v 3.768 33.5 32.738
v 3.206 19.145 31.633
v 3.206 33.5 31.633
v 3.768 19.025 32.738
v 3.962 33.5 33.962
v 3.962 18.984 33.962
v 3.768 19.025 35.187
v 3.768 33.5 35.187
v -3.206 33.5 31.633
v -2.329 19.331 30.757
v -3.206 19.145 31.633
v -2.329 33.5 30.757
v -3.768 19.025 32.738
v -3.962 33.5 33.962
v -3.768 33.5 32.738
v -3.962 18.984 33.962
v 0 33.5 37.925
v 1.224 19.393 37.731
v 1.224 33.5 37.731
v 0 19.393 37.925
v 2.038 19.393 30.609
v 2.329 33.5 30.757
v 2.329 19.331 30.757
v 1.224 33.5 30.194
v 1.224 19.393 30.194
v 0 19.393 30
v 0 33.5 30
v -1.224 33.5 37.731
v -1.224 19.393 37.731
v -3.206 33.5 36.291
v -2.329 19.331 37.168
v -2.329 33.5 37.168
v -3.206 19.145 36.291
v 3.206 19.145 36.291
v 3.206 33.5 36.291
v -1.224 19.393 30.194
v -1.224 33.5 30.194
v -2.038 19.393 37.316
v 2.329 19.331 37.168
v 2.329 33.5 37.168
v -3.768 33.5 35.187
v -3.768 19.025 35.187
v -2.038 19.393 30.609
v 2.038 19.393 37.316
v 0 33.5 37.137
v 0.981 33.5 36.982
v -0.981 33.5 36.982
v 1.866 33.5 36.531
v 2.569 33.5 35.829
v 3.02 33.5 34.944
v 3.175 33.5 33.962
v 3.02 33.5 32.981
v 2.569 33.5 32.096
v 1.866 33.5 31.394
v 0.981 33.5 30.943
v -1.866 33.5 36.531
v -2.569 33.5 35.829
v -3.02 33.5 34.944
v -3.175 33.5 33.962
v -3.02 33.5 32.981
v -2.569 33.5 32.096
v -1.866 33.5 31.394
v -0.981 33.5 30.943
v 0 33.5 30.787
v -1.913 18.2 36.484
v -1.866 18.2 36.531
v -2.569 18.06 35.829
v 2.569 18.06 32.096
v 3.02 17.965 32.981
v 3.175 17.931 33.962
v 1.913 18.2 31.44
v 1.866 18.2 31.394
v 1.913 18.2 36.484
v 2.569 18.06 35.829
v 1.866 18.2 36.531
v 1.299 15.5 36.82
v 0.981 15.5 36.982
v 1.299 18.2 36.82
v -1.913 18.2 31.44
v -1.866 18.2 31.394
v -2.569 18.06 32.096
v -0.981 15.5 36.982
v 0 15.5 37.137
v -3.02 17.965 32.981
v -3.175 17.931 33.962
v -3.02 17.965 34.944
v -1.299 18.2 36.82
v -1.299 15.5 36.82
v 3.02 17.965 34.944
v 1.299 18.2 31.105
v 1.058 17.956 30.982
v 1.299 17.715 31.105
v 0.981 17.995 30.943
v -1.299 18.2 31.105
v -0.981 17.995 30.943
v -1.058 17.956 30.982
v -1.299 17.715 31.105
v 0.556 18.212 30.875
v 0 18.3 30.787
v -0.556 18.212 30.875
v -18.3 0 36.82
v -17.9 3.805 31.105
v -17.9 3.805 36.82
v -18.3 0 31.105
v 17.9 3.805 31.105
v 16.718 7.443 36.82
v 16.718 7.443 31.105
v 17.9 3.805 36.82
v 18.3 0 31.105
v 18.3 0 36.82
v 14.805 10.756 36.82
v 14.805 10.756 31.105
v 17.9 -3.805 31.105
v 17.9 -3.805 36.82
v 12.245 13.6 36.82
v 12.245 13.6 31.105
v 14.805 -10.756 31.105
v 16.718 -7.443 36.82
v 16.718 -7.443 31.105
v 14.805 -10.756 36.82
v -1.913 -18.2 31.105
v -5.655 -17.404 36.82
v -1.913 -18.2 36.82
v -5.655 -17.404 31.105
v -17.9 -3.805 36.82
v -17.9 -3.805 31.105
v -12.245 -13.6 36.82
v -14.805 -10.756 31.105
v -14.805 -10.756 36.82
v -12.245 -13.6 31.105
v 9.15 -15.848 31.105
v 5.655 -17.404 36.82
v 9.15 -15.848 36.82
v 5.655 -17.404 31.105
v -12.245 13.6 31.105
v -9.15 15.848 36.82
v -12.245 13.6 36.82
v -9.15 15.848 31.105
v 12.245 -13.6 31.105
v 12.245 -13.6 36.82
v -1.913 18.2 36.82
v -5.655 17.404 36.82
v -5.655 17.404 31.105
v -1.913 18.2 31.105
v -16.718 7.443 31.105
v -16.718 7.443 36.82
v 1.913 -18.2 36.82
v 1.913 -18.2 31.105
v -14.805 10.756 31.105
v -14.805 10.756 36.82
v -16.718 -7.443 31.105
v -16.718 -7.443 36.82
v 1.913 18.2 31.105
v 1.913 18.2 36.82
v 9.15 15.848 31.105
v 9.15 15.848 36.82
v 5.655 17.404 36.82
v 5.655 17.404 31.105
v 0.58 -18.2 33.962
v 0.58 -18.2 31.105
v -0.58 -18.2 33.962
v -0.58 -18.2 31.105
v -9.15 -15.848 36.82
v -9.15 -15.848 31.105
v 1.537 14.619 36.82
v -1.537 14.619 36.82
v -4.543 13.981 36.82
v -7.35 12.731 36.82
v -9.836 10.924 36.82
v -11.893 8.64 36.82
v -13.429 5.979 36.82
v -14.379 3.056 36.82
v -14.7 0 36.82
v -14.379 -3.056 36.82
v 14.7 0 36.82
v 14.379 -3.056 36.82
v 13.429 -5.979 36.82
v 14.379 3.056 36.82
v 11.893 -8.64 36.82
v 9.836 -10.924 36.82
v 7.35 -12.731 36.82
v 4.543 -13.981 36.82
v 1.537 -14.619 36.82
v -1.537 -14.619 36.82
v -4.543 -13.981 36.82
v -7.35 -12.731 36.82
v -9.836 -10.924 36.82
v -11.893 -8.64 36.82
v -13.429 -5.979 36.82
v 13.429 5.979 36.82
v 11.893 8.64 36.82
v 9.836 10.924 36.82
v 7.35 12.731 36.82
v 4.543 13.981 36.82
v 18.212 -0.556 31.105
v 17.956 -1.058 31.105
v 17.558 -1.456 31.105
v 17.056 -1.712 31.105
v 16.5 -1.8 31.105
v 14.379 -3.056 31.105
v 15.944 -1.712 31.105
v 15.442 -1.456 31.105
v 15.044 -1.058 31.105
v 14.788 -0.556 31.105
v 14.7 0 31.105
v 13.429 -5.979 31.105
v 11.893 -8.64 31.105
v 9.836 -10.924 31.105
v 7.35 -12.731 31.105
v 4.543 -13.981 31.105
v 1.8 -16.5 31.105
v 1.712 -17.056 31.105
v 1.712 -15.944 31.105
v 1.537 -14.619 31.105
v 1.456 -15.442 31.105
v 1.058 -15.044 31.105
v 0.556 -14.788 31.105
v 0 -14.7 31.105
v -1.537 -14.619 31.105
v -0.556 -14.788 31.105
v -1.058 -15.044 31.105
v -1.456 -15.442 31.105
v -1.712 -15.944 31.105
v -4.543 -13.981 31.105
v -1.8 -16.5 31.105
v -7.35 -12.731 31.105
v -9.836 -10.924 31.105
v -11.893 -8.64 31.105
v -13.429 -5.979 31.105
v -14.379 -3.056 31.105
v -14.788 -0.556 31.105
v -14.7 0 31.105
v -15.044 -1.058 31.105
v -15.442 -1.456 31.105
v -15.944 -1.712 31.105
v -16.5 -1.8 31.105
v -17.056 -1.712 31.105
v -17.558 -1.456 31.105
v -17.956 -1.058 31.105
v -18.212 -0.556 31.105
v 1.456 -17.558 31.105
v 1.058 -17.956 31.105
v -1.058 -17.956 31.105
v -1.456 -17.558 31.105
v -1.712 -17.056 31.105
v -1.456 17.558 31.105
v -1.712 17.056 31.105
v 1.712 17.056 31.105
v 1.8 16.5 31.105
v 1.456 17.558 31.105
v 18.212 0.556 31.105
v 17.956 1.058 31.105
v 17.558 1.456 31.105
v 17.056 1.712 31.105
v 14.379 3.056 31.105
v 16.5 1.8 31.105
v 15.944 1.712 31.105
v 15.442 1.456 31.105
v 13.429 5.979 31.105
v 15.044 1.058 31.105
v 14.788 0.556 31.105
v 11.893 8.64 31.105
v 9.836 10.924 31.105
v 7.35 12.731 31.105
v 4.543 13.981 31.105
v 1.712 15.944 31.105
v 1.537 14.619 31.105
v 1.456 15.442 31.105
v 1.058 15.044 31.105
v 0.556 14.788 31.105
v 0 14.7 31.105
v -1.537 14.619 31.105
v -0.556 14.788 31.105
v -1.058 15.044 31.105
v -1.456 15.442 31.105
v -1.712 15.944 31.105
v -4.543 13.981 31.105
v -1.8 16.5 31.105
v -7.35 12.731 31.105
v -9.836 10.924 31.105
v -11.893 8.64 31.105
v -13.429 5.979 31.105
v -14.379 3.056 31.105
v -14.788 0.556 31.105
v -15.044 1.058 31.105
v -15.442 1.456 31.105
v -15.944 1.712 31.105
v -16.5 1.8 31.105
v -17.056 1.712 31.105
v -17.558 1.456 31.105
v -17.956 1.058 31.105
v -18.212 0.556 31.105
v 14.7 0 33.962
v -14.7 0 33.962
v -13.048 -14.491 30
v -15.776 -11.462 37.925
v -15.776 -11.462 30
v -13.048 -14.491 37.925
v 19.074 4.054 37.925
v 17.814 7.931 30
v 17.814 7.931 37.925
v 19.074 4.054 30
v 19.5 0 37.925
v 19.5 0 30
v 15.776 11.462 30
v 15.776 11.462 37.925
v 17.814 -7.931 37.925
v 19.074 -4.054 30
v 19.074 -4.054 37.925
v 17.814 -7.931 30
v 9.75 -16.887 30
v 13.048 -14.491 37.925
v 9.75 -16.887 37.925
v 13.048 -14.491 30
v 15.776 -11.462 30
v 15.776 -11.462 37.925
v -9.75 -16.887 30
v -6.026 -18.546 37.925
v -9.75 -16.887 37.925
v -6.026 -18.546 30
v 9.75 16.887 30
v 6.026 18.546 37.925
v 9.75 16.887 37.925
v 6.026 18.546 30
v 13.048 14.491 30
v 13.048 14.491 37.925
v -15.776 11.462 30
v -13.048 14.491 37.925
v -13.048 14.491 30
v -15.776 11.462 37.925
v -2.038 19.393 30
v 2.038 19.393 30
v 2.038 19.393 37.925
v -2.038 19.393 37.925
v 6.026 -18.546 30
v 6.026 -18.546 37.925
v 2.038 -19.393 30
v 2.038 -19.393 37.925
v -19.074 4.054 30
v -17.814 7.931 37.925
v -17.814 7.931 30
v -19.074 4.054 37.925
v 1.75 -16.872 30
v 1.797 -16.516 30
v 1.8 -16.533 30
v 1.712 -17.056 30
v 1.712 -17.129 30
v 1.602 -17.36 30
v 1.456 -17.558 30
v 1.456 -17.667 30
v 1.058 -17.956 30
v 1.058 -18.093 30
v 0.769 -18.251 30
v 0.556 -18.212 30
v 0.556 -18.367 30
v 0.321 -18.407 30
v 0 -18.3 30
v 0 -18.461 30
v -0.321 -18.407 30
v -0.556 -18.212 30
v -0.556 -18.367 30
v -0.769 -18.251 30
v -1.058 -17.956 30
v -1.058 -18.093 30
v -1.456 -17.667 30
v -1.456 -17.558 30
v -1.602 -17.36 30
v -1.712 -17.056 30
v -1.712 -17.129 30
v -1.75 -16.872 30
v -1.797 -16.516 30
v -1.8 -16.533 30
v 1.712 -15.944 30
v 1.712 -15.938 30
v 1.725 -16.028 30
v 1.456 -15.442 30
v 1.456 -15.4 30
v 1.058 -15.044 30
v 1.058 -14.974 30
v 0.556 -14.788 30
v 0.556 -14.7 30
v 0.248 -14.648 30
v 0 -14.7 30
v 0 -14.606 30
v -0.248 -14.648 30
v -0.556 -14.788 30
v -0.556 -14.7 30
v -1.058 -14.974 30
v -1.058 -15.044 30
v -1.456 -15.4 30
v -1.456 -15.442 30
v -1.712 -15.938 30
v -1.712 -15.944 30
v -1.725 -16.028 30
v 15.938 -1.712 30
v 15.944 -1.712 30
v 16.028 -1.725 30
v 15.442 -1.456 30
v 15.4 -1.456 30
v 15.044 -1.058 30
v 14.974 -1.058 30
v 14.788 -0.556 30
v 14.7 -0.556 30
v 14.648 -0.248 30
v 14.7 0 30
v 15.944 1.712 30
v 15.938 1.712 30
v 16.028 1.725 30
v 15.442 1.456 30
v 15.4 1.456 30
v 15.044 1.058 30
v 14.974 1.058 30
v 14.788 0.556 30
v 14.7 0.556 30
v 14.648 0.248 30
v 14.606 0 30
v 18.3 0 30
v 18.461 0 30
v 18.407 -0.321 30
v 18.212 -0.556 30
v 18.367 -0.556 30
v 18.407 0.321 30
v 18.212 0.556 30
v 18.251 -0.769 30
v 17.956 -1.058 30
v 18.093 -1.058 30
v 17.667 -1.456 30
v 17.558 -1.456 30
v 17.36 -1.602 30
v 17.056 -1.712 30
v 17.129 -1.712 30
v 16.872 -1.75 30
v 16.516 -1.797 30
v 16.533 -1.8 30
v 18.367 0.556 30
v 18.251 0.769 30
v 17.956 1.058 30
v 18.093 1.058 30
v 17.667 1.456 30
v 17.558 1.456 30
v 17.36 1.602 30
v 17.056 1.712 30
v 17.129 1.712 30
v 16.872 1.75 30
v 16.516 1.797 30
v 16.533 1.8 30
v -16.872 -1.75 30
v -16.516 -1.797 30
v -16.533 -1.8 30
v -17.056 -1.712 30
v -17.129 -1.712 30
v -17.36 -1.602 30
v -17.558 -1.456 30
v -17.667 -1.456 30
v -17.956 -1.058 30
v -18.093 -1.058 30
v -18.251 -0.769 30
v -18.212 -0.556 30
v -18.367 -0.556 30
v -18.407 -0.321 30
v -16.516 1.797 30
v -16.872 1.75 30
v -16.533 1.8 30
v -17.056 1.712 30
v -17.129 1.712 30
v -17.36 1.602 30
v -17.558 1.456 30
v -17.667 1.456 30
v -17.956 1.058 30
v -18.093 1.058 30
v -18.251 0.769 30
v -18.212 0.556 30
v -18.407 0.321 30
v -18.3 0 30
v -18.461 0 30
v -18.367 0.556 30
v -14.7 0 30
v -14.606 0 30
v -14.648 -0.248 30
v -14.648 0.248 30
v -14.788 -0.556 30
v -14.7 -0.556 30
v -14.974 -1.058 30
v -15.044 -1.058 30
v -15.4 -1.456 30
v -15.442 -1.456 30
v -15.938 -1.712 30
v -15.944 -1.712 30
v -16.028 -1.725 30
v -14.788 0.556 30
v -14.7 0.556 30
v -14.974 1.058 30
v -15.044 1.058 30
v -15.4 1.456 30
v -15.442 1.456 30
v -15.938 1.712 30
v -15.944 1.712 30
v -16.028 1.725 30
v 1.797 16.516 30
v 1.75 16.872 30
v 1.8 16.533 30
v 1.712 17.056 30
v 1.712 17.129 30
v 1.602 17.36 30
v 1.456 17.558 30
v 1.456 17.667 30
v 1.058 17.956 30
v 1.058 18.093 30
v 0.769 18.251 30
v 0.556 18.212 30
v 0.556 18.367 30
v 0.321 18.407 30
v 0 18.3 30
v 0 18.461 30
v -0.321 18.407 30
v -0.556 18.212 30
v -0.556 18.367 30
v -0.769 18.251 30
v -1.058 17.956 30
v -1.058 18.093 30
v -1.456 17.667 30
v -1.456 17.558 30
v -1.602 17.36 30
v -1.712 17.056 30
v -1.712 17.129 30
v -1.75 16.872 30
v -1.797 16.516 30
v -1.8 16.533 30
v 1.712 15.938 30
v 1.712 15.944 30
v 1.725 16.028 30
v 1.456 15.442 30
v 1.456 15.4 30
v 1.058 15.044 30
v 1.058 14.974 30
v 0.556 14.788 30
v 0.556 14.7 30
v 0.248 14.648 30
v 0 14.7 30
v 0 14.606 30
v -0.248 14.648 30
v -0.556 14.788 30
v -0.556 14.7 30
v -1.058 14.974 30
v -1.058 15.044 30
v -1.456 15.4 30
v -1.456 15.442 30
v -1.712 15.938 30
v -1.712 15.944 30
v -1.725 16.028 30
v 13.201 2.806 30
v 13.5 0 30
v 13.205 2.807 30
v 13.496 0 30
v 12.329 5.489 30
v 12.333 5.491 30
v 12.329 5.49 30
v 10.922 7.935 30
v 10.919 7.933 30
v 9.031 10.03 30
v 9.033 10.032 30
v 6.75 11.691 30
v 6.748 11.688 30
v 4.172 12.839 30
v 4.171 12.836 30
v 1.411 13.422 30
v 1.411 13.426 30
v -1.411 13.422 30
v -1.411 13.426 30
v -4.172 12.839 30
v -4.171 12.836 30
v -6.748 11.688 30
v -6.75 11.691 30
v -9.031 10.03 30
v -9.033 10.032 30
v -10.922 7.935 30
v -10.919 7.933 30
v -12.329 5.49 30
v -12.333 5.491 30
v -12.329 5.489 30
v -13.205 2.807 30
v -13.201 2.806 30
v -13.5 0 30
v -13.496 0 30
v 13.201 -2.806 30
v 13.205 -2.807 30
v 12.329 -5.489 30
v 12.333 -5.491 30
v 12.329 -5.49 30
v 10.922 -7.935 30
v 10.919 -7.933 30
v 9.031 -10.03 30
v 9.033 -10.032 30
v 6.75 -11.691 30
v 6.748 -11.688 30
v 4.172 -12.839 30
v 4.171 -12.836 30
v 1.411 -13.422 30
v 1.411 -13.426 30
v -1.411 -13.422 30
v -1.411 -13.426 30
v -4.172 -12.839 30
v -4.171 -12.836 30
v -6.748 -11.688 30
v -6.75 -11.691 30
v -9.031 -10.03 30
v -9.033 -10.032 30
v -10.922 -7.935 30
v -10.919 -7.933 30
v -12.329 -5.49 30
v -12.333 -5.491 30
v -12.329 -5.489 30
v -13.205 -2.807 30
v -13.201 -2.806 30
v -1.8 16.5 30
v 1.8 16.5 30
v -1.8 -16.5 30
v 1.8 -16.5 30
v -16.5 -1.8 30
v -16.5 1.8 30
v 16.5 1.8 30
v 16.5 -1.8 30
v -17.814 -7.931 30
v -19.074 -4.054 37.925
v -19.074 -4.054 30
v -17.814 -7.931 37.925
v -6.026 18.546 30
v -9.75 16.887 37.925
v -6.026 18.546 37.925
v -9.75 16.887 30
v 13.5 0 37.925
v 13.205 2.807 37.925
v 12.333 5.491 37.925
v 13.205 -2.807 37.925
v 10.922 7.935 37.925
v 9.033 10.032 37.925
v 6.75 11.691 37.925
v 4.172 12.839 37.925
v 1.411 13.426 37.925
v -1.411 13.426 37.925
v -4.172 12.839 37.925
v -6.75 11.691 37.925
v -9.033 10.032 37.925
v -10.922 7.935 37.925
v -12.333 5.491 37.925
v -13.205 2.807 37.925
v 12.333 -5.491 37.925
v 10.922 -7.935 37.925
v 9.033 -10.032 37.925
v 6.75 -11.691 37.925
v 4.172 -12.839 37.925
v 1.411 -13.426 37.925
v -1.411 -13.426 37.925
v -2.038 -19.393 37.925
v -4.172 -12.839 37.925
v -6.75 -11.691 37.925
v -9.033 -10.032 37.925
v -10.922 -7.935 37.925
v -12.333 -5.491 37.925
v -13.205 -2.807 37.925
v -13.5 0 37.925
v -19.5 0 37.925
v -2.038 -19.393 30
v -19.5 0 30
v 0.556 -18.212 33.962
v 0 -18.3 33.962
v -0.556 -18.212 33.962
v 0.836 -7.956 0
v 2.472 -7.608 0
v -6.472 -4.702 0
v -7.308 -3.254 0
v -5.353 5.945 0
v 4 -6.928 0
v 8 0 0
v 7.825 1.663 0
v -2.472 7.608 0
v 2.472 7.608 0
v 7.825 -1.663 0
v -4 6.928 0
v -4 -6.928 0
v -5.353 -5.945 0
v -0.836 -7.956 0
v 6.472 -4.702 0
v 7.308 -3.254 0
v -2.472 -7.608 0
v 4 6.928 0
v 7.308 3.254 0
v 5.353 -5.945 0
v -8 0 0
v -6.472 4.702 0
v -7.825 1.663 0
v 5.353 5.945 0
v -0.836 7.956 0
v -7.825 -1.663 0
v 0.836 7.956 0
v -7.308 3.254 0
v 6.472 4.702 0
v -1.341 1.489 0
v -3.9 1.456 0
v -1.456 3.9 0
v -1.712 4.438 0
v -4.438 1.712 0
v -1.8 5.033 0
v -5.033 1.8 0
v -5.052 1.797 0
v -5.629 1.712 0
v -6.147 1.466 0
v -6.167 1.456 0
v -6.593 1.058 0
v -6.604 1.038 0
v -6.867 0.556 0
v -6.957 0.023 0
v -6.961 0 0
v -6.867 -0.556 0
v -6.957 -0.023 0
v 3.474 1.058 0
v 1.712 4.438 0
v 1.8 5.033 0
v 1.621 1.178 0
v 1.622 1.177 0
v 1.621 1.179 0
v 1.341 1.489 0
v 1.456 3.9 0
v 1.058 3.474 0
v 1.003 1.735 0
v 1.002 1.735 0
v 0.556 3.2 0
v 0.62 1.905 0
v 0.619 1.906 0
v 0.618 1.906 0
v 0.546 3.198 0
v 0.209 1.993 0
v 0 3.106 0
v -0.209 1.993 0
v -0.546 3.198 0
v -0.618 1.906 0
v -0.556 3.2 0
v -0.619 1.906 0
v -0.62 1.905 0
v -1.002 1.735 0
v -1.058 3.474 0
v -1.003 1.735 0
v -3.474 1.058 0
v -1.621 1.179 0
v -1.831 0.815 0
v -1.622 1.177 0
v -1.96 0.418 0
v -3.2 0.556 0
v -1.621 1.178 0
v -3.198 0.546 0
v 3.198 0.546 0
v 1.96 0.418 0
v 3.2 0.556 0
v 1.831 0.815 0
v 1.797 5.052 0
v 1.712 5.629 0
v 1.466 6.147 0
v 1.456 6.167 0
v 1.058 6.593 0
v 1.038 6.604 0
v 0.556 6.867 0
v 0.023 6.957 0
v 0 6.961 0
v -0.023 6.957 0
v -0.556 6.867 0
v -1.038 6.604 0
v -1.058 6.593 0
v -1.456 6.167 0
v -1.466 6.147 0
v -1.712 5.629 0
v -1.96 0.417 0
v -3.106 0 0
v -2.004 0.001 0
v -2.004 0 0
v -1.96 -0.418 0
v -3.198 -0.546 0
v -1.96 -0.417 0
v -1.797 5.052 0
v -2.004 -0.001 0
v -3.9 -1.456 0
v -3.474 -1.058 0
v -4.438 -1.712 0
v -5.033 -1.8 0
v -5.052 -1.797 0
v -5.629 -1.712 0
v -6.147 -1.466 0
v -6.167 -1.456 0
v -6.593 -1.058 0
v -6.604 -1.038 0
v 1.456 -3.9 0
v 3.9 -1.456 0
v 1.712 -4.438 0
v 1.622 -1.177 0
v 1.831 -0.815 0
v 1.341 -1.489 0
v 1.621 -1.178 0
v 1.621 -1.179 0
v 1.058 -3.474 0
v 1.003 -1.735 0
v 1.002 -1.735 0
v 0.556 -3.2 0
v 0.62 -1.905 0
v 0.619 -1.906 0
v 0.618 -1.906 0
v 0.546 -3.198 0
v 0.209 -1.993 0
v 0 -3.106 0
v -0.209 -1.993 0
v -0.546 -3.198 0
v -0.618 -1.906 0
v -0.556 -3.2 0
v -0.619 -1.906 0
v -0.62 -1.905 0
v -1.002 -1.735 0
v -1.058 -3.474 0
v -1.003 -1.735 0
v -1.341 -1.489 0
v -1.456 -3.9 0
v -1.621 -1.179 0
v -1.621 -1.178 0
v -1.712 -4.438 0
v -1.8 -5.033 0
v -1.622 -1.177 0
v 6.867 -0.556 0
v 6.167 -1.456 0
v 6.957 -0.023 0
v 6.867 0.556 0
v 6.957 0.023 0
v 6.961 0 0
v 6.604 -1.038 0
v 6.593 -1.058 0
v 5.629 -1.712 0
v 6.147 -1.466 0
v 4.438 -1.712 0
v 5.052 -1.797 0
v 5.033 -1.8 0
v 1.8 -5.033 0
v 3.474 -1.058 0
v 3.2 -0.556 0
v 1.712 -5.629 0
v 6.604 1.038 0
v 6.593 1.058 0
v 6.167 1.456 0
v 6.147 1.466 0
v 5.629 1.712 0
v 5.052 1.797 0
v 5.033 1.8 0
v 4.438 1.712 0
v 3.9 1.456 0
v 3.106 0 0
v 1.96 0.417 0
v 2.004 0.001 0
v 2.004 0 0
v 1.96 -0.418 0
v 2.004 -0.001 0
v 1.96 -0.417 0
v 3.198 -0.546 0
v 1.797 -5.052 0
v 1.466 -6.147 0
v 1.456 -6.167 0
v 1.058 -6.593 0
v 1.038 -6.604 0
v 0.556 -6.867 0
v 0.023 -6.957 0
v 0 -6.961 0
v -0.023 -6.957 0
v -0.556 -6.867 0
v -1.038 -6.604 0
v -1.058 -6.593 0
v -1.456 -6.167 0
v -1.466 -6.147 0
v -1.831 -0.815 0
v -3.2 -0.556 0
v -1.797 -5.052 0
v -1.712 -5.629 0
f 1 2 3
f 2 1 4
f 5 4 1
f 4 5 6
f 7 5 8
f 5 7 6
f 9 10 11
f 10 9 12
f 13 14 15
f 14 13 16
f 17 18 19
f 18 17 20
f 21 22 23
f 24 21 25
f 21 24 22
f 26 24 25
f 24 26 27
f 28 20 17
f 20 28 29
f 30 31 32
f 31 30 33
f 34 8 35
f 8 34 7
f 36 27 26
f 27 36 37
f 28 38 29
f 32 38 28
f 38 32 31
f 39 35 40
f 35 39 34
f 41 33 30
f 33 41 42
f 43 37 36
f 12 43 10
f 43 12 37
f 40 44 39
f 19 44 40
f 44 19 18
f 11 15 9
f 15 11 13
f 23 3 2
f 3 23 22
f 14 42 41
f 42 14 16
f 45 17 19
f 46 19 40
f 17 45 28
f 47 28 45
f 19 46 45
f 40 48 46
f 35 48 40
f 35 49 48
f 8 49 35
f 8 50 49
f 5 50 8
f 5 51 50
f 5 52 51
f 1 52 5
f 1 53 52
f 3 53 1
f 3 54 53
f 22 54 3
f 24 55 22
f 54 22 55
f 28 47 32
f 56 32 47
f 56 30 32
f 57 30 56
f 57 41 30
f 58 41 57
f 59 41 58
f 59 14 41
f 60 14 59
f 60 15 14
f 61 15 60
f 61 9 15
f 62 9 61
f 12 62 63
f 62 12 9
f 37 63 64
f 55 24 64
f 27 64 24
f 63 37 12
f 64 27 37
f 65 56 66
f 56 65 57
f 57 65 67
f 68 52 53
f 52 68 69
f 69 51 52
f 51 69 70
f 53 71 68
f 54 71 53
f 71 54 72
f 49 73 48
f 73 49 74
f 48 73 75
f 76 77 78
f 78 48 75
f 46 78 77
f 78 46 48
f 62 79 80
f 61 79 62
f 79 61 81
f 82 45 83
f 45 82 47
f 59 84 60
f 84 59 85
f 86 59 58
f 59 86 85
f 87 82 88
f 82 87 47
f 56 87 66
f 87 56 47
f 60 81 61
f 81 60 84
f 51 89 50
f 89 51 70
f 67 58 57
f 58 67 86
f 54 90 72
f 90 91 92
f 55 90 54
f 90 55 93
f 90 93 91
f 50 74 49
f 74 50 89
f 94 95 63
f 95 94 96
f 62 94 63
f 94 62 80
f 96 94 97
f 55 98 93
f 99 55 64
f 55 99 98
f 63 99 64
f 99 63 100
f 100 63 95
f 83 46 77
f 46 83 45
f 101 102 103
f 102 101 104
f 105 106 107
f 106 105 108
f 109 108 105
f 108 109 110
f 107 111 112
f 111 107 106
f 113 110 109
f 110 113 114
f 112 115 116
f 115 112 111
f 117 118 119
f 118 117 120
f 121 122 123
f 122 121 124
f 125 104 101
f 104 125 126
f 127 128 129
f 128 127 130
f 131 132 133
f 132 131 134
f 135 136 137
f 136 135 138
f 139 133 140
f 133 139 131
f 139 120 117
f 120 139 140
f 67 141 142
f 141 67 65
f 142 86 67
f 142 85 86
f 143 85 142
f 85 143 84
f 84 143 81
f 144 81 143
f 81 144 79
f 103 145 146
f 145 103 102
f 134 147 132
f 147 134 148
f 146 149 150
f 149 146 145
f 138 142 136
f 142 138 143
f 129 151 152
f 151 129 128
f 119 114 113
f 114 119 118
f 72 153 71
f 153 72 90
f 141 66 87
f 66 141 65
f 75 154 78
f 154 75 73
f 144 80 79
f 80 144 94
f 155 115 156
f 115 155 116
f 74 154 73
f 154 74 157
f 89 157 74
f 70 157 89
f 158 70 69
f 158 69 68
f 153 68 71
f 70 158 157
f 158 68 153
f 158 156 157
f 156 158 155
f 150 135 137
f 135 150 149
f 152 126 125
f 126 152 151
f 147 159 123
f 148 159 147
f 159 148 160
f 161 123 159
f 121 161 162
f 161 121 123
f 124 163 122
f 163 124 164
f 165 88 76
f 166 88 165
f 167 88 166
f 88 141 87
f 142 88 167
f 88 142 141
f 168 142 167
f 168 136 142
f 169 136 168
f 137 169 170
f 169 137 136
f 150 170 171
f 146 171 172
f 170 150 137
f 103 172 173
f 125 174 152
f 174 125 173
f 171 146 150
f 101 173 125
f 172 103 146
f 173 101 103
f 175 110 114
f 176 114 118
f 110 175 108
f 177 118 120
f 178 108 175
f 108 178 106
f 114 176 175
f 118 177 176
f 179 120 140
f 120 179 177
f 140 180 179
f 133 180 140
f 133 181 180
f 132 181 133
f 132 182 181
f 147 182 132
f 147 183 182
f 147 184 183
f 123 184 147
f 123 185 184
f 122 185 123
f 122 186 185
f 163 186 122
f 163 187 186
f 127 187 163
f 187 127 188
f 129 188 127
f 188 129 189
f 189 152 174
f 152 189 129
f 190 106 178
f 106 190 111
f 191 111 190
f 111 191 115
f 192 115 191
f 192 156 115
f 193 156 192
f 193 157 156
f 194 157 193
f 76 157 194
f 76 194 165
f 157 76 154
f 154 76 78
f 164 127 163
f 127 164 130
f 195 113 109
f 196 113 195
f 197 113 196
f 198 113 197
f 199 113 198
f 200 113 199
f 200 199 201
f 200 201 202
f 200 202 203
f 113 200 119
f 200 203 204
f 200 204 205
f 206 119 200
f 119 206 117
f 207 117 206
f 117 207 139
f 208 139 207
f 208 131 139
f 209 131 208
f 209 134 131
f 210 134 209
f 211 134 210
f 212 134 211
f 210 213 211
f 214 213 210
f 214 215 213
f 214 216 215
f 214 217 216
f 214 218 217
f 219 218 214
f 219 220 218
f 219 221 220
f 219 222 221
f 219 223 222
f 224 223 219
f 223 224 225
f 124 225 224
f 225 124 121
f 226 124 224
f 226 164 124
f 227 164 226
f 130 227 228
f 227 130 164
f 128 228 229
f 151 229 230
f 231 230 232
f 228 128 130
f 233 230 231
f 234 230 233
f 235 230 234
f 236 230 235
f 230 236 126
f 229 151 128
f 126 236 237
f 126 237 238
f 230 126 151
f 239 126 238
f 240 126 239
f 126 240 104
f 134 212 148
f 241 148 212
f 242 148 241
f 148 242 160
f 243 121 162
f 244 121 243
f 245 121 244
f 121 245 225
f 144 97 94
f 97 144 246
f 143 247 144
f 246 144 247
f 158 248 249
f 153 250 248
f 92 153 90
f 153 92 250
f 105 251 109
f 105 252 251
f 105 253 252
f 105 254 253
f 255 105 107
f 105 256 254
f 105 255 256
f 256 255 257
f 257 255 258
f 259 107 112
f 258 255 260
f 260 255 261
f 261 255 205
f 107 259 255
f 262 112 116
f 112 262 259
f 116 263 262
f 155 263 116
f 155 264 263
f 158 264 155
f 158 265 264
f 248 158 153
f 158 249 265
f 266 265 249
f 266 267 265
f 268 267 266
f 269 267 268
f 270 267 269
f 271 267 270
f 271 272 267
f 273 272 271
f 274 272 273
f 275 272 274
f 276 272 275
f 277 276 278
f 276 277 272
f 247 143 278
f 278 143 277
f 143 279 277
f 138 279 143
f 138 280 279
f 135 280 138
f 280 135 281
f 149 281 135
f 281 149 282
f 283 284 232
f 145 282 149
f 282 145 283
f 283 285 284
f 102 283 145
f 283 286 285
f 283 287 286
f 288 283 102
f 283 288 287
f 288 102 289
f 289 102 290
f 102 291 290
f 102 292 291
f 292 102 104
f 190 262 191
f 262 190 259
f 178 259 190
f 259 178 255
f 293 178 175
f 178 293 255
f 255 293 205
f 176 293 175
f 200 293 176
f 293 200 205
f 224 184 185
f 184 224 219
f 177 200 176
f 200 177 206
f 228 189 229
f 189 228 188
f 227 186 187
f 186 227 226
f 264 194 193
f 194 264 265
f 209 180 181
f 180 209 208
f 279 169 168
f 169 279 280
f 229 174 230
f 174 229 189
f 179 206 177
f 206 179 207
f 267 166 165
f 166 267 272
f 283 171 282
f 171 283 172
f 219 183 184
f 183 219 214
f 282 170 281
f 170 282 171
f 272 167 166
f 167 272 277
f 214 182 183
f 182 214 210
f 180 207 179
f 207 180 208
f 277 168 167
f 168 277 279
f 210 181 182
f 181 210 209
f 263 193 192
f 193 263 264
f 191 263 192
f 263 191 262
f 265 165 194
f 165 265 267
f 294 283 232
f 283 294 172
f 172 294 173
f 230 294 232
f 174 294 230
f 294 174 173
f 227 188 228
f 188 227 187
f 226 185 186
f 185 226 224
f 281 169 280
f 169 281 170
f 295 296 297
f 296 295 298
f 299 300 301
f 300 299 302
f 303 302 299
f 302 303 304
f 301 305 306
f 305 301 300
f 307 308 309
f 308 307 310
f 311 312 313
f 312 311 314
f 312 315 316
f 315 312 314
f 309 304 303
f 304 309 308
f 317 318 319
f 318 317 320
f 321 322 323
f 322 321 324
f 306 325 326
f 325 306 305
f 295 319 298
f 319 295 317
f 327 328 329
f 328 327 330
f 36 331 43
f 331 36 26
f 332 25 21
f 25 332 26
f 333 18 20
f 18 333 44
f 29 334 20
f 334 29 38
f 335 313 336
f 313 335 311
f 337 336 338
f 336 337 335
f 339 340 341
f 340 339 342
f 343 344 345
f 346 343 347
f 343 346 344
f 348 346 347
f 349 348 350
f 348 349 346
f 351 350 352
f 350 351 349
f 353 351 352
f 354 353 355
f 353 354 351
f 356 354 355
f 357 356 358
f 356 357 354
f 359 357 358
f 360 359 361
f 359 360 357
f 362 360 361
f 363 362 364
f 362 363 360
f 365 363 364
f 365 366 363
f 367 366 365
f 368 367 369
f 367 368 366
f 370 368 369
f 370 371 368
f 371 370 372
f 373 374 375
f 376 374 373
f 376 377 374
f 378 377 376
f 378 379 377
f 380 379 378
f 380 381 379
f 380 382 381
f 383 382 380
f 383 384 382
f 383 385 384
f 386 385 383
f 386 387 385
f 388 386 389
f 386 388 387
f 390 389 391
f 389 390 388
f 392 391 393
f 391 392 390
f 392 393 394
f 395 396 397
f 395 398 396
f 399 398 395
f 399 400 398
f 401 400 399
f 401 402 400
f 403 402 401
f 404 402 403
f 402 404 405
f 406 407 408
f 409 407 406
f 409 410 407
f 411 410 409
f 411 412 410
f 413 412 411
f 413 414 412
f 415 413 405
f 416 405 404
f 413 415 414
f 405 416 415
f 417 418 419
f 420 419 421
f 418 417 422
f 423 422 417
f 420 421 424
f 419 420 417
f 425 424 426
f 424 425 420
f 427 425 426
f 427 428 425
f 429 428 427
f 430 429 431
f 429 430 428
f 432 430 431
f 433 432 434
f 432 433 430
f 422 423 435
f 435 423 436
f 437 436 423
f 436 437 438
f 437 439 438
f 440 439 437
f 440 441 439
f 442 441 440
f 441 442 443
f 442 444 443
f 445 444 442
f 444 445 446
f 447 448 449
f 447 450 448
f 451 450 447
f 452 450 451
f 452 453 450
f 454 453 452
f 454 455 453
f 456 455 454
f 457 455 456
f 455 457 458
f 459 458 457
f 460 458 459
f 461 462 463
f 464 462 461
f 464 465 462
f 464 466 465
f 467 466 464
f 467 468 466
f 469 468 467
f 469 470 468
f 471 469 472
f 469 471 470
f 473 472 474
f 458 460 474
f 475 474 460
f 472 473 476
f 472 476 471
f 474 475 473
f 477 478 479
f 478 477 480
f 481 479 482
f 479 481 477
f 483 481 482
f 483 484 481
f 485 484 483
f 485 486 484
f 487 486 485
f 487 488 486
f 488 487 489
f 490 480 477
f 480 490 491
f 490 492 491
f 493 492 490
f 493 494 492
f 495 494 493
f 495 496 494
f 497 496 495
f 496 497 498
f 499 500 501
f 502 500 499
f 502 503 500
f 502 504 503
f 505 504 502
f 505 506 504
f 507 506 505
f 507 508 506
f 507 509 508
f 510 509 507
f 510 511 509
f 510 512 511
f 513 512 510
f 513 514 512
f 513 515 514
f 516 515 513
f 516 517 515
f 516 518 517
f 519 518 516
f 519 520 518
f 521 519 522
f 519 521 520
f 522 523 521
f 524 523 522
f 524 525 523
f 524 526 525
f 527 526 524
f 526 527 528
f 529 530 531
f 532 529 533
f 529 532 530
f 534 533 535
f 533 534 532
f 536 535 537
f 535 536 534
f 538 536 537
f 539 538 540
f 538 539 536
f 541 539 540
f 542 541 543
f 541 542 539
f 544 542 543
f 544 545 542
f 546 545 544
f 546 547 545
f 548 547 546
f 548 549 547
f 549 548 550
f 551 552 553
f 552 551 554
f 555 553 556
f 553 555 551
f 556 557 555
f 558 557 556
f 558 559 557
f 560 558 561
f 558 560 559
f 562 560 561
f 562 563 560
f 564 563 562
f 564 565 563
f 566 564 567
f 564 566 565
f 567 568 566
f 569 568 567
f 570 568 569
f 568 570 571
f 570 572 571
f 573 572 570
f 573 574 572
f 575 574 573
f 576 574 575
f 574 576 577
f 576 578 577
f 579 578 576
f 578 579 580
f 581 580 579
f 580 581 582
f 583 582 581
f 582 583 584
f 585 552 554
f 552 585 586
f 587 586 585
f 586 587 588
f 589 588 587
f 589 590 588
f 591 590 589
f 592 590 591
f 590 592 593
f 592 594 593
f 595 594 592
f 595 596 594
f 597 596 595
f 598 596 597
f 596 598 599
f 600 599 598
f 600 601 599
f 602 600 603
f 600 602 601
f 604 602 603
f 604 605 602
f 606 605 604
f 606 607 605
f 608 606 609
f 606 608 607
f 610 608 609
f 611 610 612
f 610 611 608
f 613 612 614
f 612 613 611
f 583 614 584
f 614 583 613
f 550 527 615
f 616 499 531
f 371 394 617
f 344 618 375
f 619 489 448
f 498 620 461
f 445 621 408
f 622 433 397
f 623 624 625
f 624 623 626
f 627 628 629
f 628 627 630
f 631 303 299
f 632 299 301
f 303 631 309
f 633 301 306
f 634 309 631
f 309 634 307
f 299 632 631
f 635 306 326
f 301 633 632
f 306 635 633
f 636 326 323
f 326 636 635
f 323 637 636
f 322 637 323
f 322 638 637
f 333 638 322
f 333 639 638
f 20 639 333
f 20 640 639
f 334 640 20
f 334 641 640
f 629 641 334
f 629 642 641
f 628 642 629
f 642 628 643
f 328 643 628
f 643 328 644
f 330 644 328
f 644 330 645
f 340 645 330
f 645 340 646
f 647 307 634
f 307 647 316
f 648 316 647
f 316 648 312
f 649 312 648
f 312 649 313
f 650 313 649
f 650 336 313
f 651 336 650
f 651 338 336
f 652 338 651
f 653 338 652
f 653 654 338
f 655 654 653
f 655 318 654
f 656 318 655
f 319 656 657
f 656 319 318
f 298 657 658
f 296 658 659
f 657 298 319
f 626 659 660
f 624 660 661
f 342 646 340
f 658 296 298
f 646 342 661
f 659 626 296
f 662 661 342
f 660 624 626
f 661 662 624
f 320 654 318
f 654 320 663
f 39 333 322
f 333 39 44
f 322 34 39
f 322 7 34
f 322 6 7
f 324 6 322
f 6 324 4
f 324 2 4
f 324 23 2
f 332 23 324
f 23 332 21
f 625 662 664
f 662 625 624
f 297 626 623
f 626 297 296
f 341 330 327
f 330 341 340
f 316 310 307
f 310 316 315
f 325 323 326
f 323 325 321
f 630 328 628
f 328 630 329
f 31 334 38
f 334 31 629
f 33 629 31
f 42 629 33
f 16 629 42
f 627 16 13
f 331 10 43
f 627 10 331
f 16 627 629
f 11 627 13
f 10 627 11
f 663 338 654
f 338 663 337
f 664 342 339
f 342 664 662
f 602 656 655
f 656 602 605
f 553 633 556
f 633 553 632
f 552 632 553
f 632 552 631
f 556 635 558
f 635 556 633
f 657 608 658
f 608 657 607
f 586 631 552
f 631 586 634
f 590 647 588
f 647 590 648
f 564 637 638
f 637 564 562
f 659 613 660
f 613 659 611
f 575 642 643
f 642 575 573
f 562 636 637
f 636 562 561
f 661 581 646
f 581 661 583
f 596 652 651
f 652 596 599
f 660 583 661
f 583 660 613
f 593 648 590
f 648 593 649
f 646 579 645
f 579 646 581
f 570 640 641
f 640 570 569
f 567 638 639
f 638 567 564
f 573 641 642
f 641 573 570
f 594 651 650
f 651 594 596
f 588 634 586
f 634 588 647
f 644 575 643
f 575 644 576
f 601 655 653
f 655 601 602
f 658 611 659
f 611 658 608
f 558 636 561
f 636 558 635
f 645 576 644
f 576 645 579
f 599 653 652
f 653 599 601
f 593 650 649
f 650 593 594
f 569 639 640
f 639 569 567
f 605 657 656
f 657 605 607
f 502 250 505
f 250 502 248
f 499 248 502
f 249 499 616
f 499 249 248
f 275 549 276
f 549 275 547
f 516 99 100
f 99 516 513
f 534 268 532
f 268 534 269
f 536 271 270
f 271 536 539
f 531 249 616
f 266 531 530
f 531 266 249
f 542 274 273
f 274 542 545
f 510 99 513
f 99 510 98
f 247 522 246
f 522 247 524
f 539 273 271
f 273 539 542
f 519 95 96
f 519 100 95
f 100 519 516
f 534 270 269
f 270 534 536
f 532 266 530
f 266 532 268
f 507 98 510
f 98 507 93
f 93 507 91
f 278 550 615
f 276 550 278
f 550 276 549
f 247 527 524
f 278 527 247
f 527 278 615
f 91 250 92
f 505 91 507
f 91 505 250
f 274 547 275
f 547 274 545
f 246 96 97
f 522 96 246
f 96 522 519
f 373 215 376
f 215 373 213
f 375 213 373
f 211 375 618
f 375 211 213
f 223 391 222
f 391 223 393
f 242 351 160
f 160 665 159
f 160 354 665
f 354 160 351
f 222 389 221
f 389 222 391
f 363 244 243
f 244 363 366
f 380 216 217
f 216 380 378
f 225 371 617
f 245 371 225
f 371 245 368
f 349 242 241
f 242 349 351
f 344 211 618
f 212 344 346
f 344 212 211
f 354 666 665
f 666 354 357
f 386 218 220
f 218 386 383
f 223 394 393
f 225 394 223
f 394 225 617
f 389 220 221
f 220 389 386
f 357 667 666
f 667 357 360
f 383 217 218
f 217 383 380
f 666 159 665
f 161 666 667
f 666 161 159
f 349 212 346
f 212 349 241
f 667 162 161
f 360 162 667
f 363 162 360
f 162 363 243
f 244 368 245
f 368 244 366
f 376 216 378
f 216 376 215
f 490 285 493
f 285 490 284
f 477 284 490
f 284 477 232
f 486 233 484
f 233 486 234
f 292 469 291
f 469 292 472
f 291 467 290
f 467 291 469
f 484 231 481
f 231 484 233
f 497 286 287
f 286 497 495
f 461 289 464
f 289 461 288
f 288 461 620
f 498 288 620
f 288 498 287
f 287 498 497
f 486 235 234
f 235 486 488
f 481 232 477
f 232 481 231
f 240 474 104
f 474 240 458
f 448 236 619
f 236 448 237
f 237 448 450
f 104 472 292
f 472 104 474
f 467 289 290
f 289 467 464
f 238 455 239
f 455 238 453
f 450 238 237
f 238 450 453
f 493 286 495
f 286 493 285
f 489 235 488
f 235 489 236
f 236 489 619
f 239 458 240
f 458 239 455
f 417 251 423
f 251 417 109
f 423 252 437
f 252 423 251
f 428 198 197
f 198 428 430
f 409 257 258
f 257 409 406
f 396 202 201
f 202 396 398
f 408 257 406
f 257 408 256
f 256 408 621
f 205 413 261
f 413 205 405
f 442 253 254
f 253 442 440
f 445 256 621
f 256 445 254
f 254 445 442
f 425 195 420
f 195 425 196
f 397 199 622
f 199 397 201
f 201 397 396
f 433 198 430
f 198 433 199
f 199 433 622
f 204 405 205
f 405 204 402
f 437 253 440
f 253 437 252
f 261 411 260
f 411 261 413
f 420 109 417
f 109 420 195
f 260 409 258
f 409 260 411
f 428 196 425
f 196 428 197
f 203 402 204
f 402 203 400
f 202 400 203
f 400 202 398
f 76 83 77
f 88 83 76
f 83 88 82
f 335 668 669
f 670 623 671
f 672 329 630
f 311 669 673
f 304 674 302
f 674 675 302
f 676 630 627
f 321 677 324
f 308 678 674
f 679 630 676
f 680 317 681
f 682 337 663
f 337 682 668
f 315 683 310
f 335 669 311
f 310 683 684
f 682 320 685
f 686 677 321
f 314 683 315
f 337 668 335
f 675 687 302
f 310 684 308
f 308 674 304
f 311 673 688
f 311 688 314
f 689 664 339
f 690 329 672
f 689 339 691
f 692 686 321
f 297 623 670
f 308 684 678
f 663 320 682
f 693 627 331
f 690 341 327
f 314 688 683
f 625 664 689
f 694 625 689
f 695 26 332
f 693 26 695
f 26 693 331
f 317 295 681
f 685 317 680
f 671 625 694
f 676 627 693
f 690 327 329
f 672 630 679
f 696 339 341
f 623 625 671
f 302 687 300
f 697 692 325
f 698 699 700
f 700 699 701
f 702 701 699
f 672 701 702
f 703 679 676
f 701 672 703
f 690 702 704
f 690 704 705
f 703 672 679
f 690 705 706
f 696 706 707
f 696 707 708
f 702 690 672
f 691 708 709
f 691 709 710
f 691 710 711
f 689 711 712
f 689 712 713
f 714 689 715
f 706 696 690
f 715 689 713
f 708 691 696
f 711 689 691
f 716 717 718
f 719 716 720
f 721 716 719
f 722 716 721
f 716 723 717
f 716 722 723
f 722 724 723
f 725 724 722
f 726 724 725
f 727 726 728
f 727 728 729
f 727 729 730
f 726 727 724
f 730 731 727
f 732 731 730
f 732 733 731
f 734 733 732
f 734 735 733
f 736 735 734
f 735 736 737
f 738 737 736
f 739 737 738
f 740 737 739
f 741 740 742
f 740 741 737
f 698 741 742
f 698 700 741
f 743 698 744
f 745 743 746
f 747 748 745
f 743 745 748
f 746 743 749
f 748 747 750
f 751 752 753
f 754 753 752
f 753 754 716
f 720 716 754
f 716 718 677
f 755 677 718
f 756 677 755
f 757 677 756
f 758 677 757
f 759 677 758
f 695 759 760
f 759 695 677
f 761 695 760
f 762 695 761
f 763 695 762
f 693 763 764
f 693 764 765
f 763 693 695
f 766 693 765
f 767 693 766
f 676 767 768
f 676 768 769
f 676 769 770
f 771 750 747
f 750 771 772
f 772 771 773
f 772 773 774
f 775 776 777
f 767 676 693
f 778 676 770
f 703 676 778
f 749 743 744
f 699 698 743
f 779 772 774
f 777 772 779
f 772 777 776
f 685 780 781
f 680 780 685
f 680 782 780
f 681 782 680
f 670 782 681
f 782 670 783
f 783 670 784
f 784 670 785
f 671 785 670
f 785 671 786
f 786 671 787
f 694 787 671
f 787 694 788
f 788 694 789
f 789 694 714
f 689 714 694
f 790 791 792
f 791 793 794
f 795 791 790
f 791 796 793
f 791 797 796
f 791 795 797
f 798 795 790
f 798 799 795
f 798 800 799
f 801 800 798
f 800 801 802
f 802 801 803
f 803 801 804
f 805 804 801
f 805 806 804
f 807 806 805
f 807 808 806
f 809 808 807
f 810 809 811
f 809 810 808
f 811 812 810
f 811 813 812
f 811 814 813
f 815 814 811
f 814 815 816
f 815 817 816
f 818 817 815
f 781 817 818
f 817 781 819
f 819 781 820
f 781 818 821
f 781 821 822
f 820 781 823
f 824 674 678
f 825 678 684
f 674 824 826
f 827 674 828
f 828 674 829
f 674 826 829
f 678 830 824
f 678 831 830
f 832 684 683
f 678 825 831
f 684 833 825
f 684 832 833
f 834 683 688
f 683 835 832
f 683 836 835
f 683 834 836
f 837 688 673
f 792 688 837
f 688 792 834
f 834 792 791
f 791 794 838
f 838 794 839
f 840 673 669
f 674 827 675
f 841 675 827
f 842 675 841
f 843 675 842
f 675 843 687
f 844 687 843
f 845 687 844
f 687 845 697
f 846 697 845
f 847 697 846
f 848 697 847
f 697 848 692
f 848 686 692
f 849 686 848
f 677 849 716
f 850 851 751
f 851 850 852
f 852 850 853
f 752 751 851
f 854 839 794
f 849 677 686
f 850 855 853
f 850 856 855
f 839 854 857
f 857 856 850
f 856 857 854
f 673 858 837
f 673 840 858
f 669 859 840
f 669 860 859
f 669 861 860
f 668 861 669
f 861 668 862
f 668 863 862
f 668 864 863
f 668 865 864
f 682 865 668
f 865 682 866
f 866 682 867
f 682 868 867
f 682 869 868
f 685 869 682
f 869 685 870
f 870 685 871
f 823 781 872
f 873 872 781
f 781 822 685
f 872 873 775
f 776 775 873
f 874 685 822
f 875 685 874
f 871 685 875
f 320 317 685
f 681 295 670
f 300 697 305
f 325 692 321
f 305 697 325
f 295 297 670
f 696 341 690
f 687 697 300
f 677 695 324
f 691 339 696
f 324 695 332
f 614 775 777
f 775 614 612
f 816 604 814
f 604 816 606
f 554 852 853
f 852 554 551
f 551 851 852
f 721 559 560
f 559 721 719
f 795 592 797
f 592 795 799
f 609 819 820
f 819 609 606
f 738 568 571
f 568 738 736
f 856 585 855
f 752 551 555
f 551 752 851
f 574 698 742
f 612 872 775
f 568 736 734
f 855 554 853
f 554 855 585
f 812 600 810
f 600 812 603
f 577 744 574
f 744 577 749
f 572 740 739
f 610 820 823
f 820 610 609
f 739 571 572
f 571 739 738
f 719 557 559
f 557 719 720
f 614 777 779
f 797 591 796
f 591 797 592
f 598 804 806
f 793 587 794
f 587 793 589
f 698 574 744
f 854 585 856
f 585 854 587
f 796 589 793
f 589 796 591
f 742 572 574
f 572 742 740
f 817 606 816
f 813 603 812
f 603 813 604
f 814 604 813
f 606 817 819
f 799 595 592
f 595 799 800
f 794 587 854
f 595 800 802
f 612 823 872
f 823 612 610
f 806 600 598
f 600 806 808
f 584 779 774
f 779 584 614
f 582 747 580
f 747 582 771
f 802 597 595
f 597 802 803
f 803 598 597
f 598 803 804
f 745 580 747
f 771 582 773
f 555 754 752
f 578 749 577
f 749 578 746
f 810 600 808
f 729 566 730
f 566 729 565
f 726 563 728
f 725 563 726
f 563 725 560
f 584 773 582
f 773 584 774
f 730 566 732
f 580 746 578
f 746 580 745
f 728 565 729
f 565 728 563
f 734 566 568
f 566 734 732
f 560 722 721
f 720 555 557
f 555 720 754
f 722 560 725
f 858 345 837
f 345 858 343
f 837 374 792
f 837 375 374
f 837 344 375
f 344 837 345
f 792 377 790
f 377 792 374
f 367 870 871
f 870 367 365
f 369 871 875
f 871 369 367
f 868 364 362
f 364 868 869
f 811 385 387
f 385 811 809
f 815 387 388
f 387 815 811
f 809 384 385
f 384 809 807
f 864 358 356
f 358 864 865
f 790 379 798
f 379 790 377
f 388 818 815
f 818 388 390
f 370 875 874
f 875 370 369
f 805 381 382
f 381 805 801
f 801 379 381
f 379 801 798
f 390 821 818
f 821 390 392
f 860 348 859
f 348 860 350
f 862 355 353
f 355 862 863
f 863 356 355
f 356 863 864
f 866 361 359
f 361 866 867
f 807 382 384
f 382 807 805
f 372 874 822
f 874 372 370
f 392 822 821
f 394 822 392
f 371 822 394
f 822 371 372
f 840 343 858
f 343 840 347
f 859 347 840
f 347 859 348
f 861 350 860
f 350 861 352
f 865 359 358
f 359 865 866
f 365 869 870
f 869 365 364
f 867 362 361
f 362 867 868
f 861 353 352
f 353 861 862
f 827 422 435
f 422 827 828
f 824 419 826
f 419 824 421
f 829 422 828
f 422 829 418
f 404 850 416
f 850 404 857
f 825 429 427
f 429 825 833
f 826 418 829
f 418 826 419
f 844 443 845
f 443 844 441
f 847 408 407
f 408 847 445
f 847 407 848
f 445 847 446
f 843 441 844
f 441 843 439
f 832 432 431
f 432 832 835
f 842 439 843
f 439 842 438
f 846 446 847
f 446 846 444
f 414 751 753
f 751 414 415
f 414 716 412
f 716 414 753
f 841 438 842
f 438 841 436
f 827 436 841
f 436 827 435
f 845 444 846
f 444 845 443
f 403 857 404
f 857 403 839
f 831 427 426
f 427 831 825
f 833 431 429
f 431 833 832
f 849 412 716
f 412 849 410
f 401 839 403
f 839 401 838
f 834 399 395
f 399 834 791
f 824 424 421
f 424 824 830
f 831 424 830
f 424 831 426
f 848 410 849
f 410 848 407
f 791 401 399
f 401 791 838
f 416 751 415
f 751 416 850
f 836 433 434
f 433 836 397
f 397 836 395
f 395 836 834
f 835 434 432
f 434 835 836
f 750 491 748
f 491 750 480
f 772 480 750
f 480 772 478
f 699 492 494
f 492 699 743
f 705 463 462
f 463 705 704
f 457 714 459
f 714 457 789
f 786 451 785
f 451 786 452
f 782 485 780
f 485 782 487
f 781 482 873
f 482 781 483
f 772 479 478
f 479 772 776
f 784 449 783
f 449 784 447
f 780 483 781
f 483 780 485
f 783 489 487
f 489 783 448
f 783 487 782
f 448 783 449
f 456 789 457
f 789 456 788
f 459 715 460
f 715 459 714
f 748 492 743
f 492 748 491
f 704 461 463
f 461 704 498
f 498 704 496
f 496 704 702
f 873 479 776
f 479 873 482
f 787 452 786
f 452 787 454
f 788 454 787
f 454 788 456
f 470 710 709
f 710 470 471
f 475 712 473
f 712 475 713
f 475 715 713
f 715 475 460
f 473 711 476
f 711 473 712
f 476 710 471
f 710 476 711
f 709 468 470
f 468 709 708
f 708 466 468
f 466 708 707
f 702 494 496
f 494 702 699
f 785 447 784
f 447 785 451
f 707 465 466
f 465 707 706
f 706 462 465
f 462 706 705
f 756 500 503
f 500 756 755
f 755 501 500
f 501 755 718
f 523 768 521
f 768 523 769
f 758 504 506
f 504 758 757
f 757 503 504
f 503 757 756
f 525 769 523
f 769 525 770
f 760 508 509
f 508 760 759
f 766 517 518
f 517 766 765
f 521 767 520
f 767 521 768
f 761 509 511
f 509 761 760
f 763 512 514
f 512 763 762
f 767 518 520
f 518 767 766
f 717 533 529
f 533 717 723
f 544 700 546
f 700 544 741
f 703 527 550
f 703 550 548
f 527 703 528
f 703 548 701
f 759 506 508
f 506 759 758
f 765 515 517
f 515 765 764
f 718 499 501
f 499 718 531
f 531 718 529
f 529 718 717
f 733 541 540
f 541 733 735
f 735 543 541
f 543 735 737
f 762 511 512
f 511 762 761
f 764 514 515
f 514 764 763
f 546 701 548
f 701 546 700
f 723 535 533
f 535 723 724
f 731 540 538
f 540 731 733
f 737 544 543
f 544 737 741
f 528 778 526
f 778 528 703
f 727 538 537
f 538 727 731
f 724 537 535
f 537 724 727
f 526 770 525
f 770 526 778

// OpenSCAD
//upper ring around the laser lens 
airNozzleLaserMountThickness=6; //[5:8] 
// how big around the laser eye diameter is [13.5 is a k40 on a davinci)
airNozzleLaserMountRadius=13.5; // [13.5:20]
//how long this mount should be to sit flush should be at least double the size of the interior ring
airNozzleLaserMountLength=7.9248;
 //how big around the hole in the middle will be (NO AIR)
airNozzleTipMountRadius=2; // [2:8]
// size of the air tube on the side for mounting the hose
airNozzleAirTubeRadius=3.9624; 
// how round the air tube is
airNozzleAirTubeSides=20;  
//the length of the air tube for the hose connection 
airNozzleAirTubeLength=15;  // [10:20] 
//how long the down spout tube is (less = more angled tip)
airNozzleTubeLHeight=30; // [25:50] 
//how thick the down spout is
airNozzleWallThickness=6; // [5:8] 
// how big the interior tubes are, larger = more air flow (you MUST leave more then 1 mm between the size of the walls (airNozzleWallThickness and the size of the tubing (airInteriorTubeRadius) otherwise you will have holes in the walls
airInteriorTubeRadius=1.8; 
// how big the interior tubes are, larger = more air flow. This is the air inlet and upper air tubes.
airNozzleInteriorTubeRadius=3.175; 
airNozzleOffset=airNozzleWallThickness-airNozzleInteriorTubeRadius;
angle=atan((airNozzleLaserMountRadius-airNozzleTipMountRadius)/airNozzleTubeLHeight);
airNozzleLaserMountLengthAirHalfHeight=airNozzleLaserMountLength/2;

module Nozzle(){
    
    echo("angle=", angle);    
    union(){
            
        difference(){ // air nozzle
            rotate([-90, 0,0])
            translate([0, -airNozzleTubeLHeight - (airNozzleLaserMountLength /2),(airNozzleAirTubeLength /2 ) + airNozzleLaserMountRadius + airNozzleLaserMountThickness - 1])         
            cylinder(h = airNozzleAirTubeLength , r1 = airNozzleAirTubeRadius, r2 = airNozzleAirTubeRadius, center = true, $fn = airNozzleAirTubeSides);
            
            rotate([-90, 0,0]) // outer tube airhole
            translate([0, -airNozzleTubeLHeight - (airNozzleLaserMountLength /2),(airNozzleAirTubeLength /2 ) + airNozzleLaserMountRadius + airNozzleLaserMountThickness - 1]) 
            cylinder(h = airNozzleAirTubeLength  + 0.02, r1 = airNozzleInteriorTubeRadius, r2 = airNozzleInteriorTubeRadius, center = true, $fn = airNozzleAirTubeSides);
            };   

        difference(){  // laser mount 
            
            translate([0, 0,airNozzleTubeLHeight + (airNozzleLaserMountLength /2)])         
            cylinder(h = airNozzleLaserMountLength, r1 = airNozzleLaserMountRadius + airNozzleLaserMountThickness, r2 = airNozzleLaserMountRadius + airNozzleLaserMountThickness, center = true);
            
            
            translate([0, 0,airNozzleTubeLHeight+ (airNozzleLaserMountLength /2)])         
            cylinder(h = airNozzleLaserMountLength + 0.02, r1 = airNozzleLaserMountRadius + airNozzleLaserMountThickness - airNozzleLaserMountThickness, r2 = airNozzleLaserMountRadius + airNozzleLaserMountThickness - airNozzleLaserMountThickness, center = true);
            
            
            
            rotate([-90, 0,0]) // create air hole 
            translate([0, -airNozzleTubeLHeight - (airNozzleLaserMountLength /2),airNozzleLaserMountRadius + airNozzleLaserMountThickness+ (airNozzleAirTubeLength /2 )])
            cylinder(h = airNozzleAirTubeLength  + 0.02, r1 = airInteriorTubeRadius, r2 = airInteriorTubeRadius, center = true, $fn = airNozzleAirTubeSides);
                    
            
            difference(){ // inner air tube ring
                
                translate([0, 0, airNozzleTubeLHeight + (airNozzleLaserMountLength /2) ]) cylinder(h = airNozzleInteriorTubeRadius * 1.8, r1 = airNozzleLaserMountRadius + ( airNozzleLaserMountThickness  * .80 ) , r2 = airNozzleLaserMountRadius + (airNozzleLaserMountThickness * .80 ), center = true);
                
                
                translate([0, 0, airNozzleTubeLHeight + (airNozzleLaserMountLength /2) ]) cylinder(h = (airNozzleInteriorTubeRadius  * 1.8 )+ 0.02, r1 = airNozzleLaserMountRadius + ( airNozzleLaserMountThickness  * .20 ) , r2 = airNozzleLaserMountRadius + ( airNozzleLaserMountThickness  * .20 ), center = true);
        
                
                };
                // upper air tube 1
                    translate([0, airNozzleLaserMountRadius + (airNozzleLaserMountThickness * 0.50) ,airNozzleTubeLHeight])
                    cylinder(h = airNozzleLaserMountLength, r1 = airInteriorTubeRadius, r2 = airInteriorTubeRadius, center = true, $fn = airNozzleAirTubeSides);
            
             // upper air tube 2
                translate([0, -airNozzleLaserMountRadius- (airNozzleLaserMountThickness * 0.50),airNozzleTubeLHeight])
                cylinder(h = airNozzleLaserMountLength, r1 = airInteriorTubeRadius, r2 = airInteriorTubeRadius, center = true, $fn = airNozzleAirTubeSides);
            
            // inner air tube 3
                translate([-airNozzleLaserMountRadius -  (airNozzleLaserMountThickness * 0.50), 0,airNozzleTubeLHeight])
                cylinder(h = airNozzleLaserMountLength, r1 = airInteriorTubeRadius, r2 = airInteriorTubeRadius, center = true, $fn = airNozzleAirTubeSides);
                        // upper air tube 4
                translate([airNozzleLaserMountRadius  + (airNozzleLaserMountThickness * 0.50) , 0, airNozzleTubeLHeight   ])
                cylinder(h = airNozzleLaserMountLength , r1 = airInteriorTubeRadius, r2 = airInteriorTubeRadius, center = true, $fn = airNozzleAirTubeSides);

                
                rotate([-90, 0,0]) // outer tube airhole to inner connection
            translate([0, -airNozzleTubeLHeight - (airNozzleLaserMountLength /2),(airNozzleAirTubeLength /2 ) + airNozzleLaserMountRadius + airNozzleLaserMountThickness - 4])   
            cylinder(h = airNozzleAirTubeLength, r1 = airNozzleInteriorTubeRadius, r2 = airNozzleInteriorTubeRadius, center = true, $fn = airNozzleAirTubeSides);

               
           };
           
    
           difference(){        // down spout air hole
   
        
               translate([0, 0, airNozzleTubeLHeight/2 ])
               cylinder(h = airNozzleTubeLHeight, r1 = airNozzleTipMountRadius + airNozzleWallThickness, r2 = airNozzleLaserMountRadius + airNozzleWallThickness, center = true);
               
               translate([0, 0,airNozzleTubeLHeight/2])
               cylinder(h = airNozzleTubeLHeight + 0.02, r1 = airNozzleTipMountRadius + airNozzleWallThickness - airNozzleWallThickness, r2 = airNozzleLaserMountRadius + airNozzleWallThickness - airNozzleWallThickness, center = true);
           
            difference(){ //tubes inside the down spout
                // lower air tube 1 back side
            //rotate([angle, 0,0])
            //translate([0, -airNozzleWallThickness,airNozzleTubeLHeight])         
            //cylinder(h = airNozzleAirTubeLength * 2, r1 = airNozzleAirTubeRadius, r2 = airNozzleAirTubeRadius, center = true, $fn = airNozzleAirTubeSides);
            
            // lower inner air tube 1 back side
            rotate([angle, 0,0])
            translate([0, -airNozzleTipMountRadius - (airNozzleWallThickness * 0.45),airNozzleTubeLHeight])
            cylinder(h = airNozzleTubeLHeight * 2  + 0.02, r1 = airInteriorTubeRadius, r2 = airInteriorTubeRadius, center = true, $fn = airNozzleAirTubeSides);
            };   
            
            difference(){ // lower air tube 2 left side
                //rotate([0, angle,0])
                //translate([airNozzleWallThickness, 0,airNozzleTubeLHeight])
            //cylinder(h = airNozzleAirTubeLength * 2 , r1 = airNozzleAirTubeRadius, r2 = airNozzleAirTubeRadius, center = true, $fn = airNozzleAirTubeSides);
            
            // lower inner air tube 2 left side
                rotate([0, angle,0])
                translate([airNozzleTipMountRadius + (airNozzleWallThickness * 0.45), 0,airNozzleTubeLHeight])
            cylinder(h = airNozzleTubeLHeight * 2  + 0.02, r1 = airInteriorTubeRadius, r2 = airInteriorTubeRadius, center = true, $fn = airNozzleAirTubeSides);
            }; 
            
            difference(){ // lower air tube 3 right side
                //rotate([0, -angle,0])
            //translate([-airNozzleWallThickness, 0,airNozzleTubeLHeight])         
            //cylinder(h = airNozzleAirTubeLength * 2 , r1 = airNozzleAirTubeRadius, r2 = airNozzleAirTubeRadius, center = true, $fn = airNozzleAirTubeSides);
            
            // lower inner air tube 3 right side
                rotate([0, -angle,0])
            translate([-airNozzleTipMountRadius - (airNozzleWallThickness * 0.45), 0,airNozzleTubeLHeight])
            cylinder(h = airNozzleTubeLHeight * 2  + 0.02, r1 = airInteriorTubeRadius, r2 = airInteriorTubeRadius, center = true, $fn = airNozzleAirTubeSides);
            }; 
            
            difference(){ // lower air tube 4  front side
                //rotate([-angle, 0,0])
                //translate([0, airNozzleWallThickness,airNozzleTubeLHeight]) 
                   
            //cylinder(h = airNozzleAirTubeLength * 2 , r1 = airNozzleAirTubeRadius, r2 = airNozzleAirTubeRadius, center = true, $fn = airNozzleAirTubeSides);
                        // lower air tube 4 front side
                rotate([-angle, 0,0])
                translate([0, airNozzleTipMountRadius + (airNozzleWallThickness * 0.45),airNozzleTubeLHeight]) 
            //translate([airNozzleTubeLHeight + (airNozzleLaserMountLength /2), 0,airNozzleTubeLHeight/2])
            cylinder(h = airNozzleTubeLHeight * 2  + 0.02, r1 = airInteriorTubeRadius, r2 = airInteriorTubeRadius, center = true, $fn = airNozzleAirTubeSides);

            };     

    
    
    };

};
};


Nozzle();
